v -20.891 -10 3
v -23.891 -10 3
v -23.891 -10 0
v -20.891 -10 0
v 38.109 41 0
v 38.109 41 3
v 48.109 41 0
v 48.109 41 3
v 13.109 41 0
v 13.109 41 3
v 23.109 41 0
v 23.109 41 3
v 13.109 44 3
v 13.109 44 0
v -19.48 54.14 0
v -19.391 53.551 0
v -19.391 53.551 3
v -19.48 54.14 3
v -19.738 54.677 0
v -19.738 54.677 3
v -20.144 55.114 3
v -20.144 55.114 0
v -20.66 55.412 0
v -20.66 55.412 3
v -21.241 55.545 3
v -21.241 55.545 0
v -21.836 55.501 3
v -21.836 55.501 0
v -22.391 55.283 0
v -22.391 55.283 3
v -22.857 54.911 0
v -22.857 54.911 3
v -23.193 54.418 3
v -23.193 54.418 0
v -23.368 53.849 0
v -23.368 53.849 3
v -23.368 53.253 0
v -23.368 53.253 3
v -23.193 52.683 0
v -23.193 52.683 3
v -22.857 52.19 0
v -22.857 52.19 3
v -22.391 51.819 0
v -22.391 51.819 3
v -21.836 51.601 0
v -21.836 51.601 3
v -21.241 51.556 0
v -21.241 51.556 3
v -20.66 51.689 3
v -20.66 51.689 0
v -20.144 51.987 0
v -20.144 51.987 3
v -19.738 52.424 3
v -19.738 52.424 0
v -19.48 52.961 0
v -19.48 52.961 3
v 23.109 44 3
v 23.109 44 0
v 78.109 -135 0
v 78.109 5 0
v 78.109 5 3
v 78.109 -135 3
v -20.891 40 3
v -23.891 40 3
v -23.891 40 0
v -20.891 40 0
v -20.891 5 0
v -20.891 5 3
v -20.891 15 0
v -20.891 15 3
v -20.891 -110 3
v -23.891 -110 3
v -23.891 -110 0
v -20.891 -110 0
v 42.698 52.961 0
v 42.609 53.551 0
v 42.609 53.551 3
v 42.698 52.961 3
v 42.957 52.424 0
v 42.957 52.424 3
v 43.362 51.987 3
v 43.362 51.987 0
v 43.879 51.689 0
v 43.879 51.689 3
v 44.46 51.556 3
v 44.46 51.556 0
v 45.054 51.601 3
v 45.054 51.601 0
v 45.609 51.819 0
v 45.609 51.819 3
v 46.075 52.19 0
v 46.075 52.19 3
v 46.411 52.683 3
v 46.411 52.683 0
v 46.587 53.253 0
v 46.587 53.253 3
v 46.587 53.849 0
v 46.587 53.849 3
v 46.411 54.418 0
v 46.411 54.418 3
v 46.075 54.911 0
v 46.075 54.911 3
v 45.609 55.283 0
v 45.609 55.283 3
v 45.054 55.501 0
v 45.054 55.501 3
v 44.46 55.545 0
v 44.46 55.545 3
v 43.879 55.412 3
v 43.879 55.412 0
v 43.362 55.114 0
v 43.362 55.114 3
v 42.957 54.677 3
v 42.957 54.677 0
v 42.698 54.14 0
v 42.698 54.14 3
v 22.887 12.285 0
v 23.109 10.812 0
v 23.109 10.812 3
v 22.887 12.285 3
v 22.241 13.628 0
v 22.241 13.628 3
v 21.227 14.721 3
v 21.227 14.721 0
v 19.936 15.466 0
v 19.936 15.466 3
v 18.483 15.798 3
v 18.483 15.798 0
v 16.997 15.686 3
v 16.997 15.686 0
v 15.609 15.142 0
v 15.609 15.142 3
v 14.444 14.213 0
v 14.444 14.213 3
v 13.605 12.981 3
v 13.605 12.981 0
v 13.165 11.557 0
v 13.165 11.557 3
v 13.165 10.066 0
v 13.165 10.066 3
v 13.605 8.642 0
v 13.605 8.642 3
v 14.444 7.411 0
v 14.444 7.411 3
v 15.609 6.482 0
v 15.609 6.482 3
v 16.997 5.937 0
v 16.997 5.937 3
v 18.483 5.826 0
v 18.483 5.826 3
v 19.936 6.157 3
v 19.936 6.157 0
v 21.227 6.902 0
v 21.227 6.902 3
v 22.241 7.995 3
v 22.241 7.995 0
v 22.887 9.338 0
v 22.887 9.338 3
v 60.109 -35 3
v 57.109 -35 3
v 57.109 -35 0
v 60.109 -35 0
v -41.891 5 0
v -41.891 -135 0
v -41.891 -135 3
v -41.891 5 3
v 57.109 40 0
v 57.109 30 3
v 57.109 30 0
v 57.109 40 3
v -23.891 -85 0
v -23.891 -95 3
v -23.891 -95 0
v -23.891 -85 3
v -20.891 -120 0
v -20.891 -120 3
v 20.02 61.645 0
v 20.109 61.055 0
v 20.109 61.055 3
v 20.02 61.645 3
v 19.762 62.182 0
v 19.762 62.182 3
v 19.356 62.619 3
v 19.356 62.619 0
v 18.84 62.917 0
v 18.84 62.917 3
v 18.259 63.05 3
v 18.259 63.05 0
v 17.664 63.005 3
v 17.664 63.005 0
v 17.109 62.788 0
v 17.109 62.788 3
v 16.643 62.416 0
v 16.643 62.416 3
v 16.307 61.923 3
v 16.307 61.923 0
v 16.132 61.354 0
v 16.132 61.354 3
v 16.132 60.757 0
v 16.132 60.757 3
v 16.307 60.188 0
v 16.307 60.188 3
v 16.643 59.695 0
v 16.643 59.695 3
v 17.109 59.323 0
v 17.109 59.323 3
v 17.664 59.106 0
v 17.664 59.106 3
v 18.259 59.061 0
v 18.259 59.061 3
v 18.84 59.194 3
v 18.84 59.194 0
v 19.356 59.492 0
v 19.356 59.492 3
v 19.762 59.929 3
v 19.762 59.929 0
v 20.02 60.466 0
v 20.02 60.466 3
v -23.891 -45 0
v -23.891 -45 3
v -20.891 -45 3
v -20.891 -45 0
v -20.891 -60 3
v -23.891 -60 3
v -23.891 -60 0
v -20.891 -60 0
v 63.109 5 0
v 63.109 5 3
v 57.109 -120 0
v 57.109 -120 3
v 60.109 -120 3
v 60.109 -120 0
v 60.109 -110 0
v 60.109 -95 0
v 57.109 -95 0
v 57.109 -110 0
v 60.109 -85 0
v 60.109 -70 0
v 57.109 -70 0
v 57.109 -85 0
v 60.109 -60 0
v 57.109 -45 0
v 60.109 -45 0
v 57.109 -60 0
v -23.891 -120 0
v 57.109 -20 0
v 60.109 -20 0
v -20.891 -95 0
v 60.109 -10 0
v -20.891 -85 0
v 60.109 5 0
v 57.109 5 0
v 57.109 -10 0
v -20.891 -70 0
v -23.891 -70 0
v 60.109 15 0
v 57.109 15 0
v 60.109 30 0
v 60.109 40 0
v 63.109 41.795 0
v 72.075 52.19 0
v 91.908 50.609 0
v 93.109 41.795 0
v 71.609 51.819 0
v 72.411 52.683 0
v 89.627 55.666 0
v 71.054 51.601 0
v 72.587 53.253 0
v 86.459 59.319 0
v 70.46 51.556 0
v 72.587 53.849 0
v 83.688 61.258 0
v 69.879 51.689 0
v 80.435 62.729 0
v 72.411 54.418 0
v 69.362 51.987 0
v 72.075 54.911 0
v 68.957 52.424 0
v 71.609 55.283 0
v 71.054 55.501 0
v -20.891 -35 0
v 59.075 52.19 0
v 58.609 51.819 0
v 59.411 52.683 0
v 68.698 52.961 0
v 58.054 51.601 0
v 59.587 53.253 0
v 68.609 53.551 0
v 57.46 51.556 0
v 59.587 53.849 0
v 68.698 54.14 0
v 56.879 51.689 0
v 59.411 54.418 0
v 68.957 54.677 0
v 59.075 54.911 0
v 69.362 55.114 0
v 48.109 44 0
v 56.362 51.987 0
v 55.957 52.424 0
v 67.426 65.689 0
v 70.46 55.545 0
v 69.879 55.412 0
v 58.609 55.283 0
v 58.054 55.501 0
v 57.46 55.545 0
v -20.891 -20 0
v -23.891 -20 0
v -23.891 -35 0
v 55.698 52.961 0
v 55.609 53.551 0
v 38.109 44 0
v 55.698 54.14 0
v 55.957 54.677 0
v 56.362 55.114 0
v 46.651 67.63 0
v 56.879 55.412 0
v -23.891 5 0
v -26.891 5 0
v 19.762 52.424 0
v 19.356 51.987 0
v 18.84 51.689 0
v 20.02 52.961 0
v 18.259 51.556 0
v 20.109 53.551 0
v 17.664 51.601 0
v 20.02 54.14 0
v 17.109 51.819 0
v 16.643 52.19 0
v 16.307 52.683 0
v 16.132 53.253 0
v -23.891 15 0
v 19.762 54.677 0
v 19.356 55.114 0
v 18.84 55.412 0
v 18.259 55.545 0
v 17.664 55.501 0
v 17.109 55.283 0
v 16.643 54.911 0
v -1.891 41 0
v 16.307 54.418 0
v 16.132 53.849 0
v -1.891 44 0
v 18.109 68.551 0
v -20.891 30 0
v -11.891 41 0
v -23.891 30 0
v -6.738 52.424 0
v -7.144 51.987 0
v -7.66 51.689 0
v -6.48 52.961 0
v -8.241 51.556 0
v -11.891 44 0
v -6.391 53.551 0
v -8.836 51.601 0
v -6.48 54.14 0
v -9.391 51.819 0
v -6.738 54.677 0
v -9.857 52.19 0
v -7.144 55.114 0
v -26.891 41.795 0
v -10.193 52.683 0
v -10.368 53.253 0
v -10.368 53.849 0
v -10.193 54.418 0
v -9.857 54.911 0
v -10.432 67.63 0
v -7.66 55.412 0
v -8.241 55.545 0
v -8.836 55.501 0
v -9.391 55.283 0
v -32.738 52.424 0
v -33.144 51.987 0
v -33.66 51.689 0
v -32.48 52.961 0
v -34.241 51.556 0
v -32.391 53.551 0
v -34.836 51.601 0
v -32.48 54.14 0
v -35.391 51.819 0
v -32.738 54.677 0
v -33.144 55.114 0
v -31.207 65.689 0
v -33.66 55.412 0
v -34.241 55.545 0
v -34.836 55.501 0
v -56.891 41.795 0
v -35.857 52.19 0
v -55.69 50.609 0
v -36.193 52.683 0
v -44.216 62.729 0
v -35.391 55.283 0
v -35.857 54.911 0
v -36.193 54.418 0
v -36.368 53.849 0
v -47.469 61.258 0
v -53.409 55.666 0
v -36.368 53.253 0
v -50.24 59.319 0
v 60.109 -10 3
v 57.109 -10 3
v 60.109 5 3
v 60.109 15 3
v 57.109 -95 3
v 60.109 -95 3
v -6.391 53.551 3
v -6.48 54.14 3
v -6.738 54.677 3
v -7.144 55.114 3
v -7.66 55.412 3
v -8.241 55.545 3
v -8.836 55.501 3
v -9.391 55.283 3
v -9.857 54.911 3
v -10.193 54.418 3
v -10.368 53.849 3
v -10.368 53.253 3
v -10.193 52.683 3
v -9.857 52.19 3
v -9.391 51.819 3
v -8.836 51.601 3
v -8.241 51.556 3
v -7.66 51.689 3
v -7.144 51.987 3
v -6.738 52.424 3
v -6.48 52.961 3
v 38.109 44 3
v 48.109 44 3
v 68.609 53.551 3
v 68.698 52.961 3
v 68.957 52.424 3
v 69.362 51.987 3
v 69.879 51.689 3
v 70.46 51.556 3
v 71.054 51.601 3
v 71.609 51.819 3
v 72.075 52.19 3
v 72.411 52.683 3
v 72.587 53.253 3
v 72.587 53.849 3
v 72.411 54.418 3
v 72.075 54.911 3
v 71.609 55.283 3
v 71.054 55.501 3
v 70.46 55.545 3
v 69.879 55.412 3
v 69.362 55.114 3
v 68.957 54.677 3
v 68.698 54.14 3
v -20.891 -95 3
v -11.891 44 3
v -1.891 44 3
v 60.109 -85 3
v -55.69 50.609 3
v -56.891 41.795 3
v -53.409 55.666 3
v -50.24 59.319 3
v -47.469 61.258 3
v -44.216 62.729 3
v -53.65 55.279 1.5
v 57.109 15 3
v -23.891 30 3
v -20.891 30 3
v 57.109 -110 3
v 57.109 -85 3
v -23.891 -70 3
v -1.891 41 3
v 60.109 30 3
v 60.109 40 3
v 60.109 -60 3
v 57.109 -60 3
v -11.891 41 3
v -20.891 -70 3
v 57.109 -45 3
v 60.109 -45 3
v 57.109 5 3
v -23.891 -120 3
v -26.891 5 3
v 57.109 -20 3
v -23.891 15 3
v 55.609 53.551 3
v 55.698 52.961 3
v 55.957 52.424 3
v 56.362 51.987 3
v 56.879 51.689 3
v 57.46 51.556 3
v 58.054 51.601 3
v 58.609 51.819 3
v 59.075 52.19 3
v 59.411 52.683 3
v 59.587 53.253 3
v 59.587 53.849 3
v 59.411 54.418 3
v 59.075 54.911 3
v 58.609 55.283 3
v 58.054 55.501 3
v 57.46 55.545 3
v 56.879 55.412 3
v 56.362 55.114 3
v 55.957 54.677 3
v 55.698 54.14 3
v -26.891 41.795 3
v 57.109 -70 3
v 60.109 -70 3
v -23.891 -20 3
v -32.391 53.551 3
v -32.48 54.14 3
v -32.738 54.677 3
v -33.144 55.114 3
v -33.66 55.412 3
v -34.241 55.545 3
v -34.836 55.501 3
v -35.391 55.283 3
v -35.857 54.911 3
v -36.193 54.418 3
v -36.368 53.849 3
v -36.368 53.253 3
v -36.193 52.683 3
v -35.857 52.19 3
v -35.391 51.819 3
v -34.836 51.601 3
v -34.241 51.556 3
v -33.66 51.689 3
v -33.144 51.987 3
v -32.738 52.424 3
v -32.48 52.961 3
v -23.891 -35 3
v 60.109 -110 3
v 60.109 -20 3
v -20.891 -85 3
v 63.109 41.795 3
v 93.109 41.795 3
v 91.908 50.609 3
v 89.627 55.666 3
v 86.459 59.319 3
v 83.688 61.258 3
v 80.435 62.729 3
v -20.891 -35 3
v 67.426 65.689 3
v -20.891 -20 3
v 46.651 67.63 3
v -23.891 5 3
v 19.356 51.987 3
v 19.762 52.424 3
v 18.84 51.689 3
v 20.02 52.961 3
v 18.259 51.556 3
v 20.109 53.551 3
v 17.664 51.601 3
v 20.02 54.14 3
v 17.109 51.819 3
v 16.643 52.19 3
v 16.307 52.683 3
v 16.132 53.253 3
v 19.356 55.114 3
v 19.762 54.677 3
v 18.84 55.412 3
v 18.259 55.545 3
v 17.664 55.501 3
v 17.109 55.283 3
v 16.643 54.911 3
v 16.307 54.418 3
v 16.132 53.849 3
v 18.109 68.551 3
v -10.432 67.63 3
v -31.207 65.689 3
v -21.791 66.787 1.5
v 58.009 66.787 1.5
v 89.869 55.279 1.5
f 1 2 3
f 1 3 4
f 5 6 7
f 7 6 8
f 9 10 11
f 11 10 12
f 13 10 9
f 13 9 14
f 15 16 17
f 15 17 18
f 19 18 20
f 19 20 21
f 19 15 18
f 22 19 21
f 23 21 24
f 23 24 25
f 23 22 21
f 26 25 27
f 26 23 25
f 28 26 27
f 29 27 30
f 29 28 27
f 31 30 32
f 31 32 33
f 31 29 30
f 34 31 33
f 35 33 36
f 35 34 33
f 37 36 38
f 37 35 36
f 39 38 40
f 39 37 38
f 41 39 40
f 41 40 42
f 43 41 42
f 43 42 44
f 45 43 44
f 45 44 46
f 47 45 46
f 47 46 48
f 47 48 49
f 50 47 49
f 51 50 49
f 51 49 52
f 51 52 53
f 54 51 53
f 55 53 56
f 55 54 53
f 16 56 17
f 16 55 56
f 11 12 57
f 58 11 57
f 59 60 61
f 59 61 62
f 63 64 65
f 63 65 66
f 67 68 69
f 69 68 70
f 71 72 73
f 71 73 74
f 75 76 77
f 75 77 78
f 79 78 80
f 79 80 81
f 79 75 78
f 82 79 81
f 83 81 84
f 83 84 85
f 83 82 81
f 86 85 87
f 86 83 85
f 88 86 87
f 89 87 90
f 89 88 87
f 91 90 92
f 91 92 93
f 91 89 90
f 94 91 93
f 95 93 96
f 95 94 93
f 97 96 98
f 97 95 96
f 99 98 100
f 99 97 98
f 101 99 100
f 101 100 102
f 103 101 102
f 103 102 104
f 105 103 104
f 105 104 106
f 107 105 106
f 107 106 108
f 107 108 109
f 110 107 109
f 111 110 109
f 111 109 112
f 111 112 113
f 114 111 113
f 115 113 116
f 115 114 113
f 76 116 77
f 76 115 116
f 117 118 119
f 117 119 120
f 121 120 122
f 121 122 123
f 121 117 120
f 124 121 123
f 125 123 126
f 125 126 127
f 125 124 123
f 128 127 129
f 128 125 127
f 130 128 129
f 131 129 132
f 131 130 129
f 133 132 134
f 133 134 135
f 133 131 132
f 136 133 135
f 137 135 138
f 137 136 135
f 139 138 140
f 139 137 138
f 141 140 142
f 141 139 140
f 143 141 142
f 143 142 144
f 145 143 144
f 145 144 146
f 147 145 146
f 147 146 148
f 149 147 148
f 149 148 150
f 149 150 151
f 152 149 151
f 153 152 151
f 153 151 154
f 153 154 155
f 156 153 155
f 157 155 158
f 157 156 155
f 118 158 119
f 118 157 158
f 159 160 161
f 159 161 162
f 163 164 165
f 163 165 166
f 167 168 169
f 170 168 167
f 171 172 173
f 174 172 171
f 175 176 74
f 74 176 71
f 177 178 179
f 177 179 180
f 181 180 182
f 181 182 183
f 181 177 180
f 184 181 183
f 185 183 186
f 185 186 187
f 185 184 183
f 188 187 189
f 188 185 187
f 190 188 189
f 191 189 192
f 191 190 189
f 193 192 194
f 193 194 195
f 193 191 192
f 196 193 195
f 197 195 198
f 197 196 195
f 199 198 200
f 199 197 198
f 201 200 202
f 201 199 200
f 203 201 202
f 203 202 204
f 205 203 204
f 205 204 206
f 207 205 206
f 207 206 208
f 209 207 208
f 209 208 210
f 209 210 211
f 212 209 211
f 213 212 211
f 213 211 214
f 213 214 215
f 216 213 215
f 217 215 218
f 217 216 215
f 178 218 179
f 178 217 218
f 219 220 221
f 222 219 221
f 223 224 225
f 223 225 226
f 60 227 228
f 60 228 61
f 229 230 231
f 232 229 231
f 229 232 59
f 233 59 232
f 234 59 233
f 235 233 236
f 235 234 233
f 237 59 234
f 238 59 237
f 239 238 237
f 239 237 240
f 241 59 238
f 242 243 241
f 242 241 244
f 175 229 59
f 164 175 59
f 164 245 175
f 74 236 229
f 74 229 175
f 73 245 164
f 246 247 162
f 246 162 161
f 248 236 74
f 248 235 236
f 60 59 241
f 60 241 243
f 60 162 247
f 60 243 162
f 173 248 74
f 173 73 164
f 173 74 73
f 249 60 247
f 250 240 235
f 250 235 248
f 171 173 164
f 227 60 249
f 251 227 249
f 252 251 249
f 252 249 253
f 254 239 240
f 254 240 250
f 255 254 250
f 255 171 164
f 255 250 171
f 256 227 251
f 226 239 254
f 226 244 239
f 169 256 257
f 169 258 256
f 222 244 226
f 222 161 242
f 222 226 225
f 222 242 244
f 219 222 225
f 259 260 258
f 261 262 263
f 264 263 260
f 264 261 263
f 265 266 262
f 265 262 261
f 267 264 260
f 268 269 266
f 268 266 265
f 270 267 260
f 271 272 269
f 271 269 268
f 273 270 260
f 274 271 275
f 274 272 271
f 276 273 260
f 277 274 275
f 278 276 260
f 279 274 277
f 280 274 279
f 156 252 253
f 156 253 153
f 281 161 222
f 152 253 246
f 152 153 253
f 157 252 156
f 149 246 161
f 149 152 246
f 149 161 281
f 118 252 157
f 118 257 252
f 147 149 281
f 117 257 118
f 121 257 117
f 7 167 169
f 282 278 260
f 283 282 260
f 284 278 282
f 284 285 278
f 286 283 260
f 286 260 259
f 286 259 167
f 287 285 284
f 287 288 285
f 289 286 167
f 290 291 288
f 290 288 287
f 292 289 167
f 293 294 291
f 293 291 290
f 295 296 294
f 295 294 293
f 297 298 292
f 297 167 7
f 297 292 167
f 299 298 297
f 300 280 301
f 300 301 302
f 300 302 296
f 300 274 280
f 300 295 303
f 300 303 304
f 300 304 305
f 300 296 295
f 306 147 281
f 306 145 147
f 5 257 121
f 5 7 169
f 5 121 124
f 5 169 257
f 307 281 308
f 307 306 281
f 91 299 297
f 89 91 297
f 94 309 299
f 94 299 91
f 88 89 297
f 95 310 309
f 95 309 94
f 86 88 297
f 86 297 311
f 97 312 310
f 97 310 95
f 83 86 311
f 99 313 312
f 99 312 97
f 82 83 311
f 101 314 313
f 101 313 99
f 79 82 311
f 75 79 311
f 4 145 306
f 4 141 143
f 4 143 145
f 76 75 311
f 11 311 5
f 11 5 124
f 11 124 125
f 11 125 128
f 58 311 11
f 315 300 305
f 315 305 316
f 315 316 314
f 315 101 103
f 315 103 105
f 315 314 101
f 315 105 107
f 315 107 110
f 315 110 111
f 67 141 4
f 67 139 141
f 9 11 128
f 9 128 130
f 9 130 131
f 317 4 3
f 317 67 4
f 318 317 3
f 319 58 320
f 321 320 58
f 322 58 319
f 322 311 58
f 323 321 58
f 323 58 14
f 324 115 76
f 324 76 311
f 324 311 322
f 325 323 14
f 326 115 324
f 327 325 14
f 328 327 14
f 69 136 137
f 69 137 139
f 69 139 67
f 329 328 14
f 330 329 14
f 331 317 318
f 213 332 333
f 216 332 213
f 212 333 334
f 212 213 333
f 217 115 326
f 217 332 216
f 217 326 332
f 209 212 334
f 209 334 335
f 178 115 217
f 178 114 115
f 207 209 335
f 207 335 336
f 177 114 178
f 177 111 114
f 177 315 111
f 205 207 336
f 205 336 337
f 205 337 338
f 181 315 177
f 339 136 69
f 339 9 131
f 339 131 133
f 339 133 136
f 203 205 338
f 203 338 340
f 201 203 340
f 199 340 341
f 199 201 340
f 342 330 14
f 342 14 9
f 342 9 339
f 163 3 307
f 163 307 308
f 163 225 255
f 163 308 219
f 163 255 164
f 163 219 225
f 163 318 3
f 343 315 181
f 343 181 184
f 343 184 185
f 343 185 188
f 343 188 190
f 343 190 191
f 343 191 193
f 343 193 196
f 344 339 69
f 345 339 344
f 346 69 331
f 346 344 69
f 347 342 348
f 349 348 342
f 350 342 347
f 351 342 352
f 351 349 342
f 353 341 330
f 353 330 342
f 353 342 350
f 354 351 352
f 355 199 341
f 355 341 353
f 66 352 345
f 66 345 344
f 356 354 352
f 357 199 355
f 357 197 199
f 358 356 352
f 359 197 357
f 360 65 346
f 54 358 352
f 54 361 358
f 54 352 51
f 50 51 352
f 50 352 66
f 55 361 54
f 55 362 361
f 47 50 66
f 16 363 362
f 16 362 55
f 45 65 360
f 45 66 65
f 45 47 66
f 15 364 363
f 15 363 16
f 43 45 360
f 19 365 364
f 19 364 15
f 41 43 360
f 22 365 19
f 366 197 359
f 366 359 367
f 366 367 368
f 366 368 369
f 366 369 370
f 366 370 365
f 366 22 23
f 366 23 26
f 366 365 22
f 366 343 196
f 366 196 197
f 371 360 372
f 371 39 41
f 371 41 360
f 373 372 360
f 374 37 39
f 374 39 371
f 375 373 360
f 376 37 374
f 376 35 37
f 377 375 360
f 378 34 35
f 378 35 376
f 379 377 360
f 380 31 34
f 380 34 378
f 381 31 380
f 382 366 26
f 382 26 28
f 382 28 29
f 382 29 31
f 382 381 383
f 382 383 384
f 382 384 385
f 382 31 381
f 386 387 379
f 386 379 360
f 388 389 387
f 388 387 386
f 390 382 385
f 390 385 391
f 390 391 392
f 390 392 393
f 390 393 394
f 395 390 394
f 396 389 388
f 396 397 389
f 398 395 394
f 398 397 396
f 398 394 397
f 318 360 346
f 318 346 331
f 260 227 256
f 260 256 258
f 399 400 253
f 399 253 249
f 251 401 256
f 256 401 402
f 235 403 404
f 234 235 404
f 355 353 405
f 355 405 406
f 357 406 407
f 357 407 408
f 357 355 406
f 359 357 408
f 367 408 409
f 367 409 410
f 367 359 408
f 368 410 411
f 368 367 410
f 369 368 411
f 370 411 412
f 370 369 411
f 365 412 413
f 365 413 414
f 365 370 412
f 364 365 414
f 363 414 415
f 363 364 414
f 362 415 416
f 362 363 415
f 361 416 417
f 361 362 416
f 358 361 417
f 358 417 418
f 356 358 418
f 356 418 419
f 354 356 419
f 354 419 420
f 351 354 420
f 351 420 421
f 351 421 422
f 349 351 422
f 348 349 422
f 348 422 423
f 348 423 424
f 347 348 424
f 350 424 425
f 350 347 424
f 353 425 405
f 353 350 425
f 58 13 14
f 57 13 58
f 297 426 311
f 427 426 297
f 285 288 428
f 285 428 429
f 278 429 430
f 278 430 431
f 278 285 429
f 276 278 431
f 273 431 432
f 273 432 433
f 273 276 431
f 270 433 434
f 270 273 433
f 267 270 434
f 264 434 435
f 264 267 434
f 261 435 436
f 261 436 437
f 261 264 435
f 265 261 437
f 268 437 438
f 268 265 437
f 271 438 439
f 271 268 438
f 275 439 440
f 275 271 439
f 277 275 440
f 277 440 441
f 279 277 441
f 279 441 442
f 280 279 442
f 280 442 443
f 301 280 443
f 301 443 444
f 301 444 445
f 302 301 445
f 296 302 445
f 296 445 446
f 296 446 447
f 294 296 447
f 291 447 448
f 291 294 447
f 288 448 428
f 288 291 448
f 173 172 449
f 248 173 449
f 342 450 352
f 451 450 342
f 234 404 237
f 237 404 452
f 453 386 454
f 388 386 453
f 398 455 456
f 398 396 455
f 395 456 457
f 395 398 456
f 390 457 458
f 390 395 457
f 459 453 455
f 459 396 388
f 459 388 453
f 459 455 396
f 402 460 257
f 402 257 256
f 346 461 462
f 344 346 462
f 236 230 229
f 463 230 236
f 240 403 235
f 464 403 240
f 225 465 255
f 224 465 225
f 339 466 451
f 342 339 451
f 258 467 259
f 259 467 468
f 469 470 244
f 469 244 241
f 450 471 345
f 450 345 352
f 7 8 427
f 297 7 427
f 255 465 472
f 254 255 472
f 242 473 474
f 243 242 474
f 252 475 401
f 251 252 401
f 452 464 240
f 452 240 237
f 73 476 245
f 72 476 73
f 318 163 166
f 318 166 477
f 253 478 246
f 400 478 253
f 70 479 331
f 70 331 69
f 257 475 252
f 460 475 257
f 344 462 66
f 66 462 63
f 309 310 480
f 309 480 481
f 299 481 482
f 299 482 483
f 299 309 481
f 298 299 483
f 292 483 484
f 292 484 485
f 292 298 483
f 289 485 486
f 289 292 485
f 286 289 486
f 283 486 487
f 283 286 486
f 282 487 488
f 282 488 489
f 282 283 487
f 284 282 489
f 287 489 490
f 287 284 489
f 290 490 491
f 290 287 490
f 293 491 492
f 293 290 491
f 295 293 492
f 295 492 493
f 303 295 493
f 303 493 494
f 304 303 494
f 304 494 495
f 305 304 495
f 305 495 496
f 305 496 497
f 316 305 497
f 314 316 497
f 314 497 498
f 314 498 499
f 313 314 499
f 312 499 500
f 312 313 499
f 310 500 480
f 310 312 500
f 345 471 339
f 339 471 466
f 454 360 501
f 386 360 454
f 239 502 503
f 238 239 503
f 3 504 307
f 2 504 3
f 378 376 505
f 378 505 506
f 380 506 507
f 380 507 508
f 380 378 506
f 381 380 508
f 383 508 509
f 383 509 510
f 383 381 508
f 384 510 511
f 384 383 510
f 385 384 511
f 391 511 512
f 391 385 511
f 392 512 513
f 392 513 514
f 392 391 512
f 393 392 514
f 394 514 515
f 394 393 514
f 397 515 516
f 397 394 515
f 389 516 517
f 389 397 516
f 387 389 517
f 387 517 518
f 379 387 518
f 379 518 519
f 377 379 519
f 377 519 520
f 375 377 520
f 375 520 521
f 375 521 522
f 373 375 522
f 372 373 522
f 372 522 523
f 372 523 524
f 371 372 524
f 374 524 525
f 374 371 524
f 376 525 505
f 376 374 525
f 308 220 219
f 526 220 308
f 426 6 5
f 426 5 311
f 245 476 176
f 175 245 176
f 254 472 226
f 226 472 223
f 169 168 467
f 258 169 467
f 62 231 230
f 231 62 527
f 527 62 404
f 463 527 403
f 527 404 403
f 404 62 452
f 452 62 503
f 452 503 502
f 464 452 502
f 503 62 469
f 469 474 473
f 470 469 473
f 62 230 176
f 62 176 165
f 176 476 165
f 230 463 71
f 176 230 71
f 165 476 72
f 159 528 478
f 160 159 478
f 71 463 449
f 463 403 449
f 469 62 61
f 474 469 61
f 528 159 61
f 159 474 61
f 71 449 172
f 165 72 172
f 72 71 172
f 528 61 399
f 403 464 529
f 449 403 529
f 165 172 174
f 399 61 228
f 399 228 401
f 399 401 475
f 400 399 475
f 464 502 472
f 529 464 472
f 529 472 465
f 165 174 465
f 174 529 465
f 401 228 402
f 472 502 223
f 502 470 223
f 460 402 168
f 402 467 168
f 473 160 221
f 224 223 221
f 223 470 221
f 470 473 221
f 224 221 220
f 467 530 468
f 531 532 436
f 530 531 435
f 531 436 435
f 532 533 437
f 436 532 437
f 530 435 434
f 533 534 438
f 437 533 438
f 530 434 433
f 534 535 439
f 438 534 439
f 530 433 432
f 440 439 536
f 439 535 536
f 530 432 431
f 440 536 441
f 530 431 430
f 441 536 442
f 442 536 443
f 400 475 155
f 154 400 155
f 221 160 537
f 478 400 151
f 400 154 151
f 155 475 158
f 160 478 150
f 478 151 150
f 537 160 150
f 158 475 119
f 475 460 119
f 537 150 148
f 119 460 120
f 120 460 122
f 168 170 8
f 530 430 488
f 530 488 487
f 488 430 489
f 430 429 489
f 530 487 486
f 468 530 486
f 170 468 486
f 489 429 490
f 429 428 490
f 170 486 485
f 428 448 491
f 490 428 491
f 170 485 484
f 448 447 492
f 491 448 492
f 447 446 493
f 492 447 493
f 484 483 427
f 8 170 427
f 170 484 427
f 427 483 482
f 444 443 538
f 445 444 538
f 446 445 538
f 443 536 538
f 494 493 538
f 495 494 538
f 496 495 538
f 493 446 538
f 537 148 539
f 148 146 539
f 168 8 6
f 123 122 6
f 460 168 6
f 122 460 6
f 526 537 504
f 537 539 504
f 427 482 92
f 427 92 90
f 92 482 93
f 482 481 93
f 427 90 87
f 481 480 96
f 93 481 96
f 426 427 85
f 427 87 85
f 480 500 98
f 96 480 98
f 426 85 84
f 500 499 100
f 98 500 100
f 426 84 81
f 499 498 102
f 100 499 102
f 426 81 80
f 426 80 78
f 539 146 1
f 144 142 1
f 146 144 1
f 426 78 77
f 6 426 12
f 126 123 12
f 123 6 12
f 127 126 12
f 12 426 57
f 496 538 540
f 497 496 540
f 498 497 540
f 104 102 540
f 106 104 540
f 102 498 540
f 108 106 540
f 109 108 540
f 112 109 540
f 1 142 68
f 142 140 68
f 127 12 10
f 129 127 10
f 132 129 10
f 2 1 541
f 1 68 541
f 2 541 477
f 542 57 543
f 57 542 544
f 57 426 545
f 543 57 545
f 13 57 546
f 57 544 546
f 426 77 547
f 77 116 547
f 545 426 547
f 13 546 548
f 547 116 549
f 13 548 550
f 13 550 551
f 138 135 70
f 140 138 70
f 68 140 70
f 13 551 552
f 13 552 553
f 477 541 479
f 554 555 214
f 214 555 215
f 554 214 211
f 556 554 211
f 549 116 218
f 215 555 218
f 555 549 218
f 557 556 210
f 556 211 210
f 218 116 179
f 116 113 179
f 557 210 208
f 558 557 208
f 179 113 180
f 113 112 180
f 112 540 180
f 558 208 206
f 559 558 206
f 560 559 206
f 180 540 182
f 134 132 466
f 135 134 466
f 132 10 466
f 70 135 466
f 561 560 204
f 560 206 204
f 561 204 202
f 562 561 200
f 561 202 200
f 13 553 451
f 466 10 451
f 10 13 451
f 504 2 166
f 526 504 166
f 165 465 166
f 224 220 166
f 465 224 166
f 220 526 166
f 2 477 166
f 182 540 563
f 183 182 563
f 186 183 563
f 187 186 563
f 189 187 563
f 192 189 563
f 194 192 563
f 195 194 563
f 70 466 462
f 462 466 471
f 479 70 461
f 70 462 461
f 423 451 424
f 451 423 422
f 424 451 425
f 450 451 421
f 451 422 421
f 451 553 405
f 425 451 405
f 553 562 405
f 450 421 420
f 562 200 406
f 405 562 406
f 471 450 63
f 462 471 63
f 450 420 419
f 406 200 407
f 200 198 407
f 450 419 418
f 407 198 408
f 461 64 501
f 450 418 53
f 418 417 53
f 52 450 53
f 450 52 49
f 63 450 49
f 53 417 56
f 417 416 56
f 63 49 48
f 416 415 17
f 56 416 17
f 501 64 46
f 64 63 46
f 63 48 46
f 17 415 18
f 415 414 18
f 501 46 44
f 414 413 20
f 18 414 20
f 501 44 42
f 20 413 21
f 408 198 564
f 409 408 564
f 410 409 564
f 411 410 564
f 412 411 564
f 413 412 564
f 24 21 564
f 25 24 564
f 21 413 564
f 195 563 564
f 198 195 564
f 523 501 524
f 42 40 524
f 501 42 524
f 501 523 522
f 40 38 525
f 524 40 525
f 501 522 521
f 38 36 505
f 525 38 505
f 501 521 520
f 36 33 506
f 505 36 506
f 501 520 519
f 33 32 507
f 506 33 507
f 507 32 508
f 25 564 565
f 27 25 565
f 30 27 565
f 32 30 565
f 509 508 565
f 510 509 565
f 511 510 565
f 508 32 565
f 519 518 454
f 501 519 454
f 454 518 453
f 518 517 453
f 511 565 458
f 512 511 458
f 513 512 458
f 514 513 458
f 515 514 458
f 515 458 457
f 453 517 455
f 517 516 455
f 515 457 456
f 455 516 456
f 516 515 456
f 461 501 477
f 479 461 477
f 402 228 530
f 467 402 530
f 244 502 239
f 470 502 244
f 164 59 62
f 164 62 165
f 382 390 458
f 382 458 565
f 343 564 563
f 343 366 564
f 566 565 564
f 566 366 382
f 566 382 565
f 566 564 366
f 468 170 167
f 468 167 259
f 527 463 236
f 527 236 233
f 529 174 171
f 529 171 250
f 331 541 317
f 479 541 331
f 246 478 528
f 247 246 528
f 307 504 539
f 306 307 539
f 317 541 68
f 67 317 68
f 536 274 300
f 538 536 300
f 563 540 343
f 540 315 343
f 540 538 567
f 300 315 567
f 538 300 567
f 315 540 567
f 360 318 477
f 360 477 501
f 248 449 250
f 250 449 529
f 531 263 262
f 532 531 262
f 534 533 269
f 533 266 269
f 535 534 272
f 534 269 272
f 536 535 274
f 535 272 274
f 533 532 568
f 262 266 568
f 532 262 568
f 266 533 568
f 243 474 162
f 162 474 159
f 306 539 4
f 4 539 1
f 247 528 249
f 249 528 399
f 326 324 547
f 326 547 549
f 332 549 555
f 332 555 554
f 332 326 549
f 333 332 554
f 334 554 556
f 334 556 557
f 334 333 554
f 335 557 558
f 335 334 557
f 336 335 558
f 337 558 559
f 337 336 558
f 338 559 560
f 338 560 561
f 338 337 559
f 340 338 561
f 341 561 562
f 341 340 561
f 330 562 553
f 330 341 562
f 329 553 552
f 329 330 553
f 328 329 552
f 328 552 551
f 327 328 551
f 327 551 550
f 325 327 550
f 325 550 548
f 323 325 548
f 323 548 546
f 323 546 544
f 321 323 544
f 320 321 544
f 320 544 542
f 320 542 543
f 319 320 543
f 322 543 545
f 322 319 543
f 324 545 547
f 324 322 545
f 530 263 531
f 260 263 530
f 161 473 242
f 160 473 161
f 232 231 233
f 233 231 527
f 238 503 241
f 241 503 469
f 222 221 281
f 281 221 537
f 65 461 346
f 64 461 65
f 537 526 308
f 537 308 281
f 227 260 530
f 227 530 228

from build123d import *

# Parameters (mm, degrees)
ESQUISSE1_R             = 5
ESQUISSE1_R_2           = 2
BOSS_EXTRU_1_DEPTH      = 3
ESQUISSE3_W             = 3
ESQUISSE3_H             = 10
ESQUISSE3_W_2           = 10
ESQUISSE3_H_2           = 3
ENL_V_MAT_EXTRU_1_DEPTH = 165.022412006


with BuildPart() as part:
    # Esquisse1 → Boss.-Extru.1 (new body)
    with BuildSketch(Plane.XY):
        with BuildLine():
            Line((78.109352882, -135), (-41.890647118, -135))
            Line((-41.890647118, -135), (-41.890647118, 5))
            Line((-41.890647118, 5), (-26.890647118, 5))
            Line((-26.890647118, 5), (-26.890647118, 41.795417818))
            Line((-26.890647118, 41.795417818), (-56.890647118, 41.795417818))
            add(Edge.make_bspline(
                [(-56.890647118, 41.795417818), (-56.746915478, 58.294848354), (-44.215904994, 62.728898217)],
                knots=[0, 0, 0, 1, 1, 1], degree=2))
            add(Edge.make_bspline(
                [(-44.215904994, 62.728898217), (-30.528185851, 67.934087187), (18.109352882, 68.550704045)],
                knots=[0, 0, 0, 1, 1, 1], degree=2))
            add(Edge.make_bspline(
                [(80.434610758, 62.728898217), (66.746891614, 67.934087187), (18.109352882, 68.550704045)],
                knots=[0, 0, 0, 1, 1, 1], degree=2))
            add(Edge.make_bspline(
                [(93.109352882, 41.795417818), (92.965621241, 58.294848354), (80.434610758, 62.728898217)],
                knots=[0, 0, 0, 1, 1, 1], degree=2))
            Line((93.109352882, 41.795417818), (63.109352882, 41.795417818))
            Line((63.109352882, 41.795417818), (63.109352882, 5))
            Line((63.109352882, 5), (78.109352882, 5))
            Line((78.109352882, 5), (78.109352882, -135))
        make_face()
        with Locations((18.109352882, 10.811644987)):
            Circle(ESQUISSE1_R, mode=Mode.SUBTRACT)
        with Locations((18.109352882, 53.550704045)):
            Circle(ESQUISSE1_R_2, mode=Mode.SUBTRACT)
        with Locations((-8.390647118, 53.550704045)):
            Circle(ESQUISSE1_R_2, mode=Mode.SUBTRACT)
        with Locations((-34.390647118, 53.550704045)):
            Circle(ESQUISSE1_R_2, mode=Mode.SUBTRACT)
        with Locations(Location((70.609352882, 53.550704045, 0), (0, 0, 180))):
            Circle(ESQUISSE1_R_2, mode=Mode.SUBTRACT)
        with Locations(Location((44.609352882, 53.550704045, 0), (0, 0, 180))):
            Circle(ESQUISSE1_R_2, mode=Mode.SUBTRACT)
        with Locations((18.109352882, 61.055482272)):
            Circle(ESQUISSE1_R_2, mode=Mode.SUBTRACT)
        with Locations((-21.390647118, 53.550704045)):
            Circle(ESQUISSE1_R_2, mode=Mode.SUBTRACT)
        with Locations(Location((57.609352882, 53.550704045, 0), (0, 0, 180))):
            Circle(ESQUISSE1_R_2, mode=Mode.SUBTRACT)
    extrude(amount=BOSS_EXTRU_1_DEPTH)

    # Esquisse3 → Enlèv. mat.-Extru.1 (cut, through all)
    with BuildSketch(Plane.XY.offset(3)):
        with Locations((-22.390647118, -115)):
            Rectangle(ESQUISSE3_W, ESQUISSE3_H)
        with Locations((-22.390647118, -90)):
            Rectangle(ESQUISSE3_W, ESQUISSE3_H)
        with Locations((-22.390647118, -65)):
            Rectangle(ESQUISSE3_W, ESQUISSE3_H)
        with Locations((-22.390647118, -40)):
            Rectangle(ESQUISSE3_W, ESQUISSE3_H)
        with Locations((-22.390647118, -15)):
            Rectangle(ESQUISSE3_W, ESQUISSE3_H)
        with Locations((-22.390647118, 10)):
            Rectangle(ESQUISSE3_W, ESQUISSE3_H)
        with Locations((-22.390647118, 35)):
            Rectangle(ESQUISSE3_W, ESQUISSE3_H)
        with Locations((58.609352882, -15)):
            Rectangle(ESQUISSE3_W, ESQUISSE3_H)
        with Locations((58.609352882, 10)):
            Rectangle(ESQUISSE3_W, ESQUISSE3_H)
        with Locations((58.609352882, 35)):
            Rectangle(ESQUISSE3_W, ESQUISSE3_H)
        with Locations((58.609352882, -65)):
            Rectangle(ESQUISSE3_W, ESQUISSE3_H)
        with Locations((58.609352882, -40)):
            Rectangle(ESQUISSE3_W, ESQUISSE3_H)
        with Locations((58.609352882, -90)):
            Rectangle(ESQUISSE3_W, ESQUISSE3_H)
        with Locations((58.609352882, -115)):
            Rectangle(ESQUISSE3_W, ESQUISSE3_H)
        with Locations((-6.890647118, 42.5)):
            Rectangle(ESQUISSE3_W_2, ESQUISSE3_H_2)
        with Locations((18.109352882, 42.5)):
            Rectangle(ESQUISSE3_W_2, ESQUISSE3_H_2)
        with Locations((43.109352882, 42.5)):
            Rectangle(ESQUISSE3_W_2, ESQUISSE3_H_2)
    extrude(amount=-ENL_V_MAT_EXTRU_1_DEPTH, mode=Mode.SUBTRACT)


solid = part.part
